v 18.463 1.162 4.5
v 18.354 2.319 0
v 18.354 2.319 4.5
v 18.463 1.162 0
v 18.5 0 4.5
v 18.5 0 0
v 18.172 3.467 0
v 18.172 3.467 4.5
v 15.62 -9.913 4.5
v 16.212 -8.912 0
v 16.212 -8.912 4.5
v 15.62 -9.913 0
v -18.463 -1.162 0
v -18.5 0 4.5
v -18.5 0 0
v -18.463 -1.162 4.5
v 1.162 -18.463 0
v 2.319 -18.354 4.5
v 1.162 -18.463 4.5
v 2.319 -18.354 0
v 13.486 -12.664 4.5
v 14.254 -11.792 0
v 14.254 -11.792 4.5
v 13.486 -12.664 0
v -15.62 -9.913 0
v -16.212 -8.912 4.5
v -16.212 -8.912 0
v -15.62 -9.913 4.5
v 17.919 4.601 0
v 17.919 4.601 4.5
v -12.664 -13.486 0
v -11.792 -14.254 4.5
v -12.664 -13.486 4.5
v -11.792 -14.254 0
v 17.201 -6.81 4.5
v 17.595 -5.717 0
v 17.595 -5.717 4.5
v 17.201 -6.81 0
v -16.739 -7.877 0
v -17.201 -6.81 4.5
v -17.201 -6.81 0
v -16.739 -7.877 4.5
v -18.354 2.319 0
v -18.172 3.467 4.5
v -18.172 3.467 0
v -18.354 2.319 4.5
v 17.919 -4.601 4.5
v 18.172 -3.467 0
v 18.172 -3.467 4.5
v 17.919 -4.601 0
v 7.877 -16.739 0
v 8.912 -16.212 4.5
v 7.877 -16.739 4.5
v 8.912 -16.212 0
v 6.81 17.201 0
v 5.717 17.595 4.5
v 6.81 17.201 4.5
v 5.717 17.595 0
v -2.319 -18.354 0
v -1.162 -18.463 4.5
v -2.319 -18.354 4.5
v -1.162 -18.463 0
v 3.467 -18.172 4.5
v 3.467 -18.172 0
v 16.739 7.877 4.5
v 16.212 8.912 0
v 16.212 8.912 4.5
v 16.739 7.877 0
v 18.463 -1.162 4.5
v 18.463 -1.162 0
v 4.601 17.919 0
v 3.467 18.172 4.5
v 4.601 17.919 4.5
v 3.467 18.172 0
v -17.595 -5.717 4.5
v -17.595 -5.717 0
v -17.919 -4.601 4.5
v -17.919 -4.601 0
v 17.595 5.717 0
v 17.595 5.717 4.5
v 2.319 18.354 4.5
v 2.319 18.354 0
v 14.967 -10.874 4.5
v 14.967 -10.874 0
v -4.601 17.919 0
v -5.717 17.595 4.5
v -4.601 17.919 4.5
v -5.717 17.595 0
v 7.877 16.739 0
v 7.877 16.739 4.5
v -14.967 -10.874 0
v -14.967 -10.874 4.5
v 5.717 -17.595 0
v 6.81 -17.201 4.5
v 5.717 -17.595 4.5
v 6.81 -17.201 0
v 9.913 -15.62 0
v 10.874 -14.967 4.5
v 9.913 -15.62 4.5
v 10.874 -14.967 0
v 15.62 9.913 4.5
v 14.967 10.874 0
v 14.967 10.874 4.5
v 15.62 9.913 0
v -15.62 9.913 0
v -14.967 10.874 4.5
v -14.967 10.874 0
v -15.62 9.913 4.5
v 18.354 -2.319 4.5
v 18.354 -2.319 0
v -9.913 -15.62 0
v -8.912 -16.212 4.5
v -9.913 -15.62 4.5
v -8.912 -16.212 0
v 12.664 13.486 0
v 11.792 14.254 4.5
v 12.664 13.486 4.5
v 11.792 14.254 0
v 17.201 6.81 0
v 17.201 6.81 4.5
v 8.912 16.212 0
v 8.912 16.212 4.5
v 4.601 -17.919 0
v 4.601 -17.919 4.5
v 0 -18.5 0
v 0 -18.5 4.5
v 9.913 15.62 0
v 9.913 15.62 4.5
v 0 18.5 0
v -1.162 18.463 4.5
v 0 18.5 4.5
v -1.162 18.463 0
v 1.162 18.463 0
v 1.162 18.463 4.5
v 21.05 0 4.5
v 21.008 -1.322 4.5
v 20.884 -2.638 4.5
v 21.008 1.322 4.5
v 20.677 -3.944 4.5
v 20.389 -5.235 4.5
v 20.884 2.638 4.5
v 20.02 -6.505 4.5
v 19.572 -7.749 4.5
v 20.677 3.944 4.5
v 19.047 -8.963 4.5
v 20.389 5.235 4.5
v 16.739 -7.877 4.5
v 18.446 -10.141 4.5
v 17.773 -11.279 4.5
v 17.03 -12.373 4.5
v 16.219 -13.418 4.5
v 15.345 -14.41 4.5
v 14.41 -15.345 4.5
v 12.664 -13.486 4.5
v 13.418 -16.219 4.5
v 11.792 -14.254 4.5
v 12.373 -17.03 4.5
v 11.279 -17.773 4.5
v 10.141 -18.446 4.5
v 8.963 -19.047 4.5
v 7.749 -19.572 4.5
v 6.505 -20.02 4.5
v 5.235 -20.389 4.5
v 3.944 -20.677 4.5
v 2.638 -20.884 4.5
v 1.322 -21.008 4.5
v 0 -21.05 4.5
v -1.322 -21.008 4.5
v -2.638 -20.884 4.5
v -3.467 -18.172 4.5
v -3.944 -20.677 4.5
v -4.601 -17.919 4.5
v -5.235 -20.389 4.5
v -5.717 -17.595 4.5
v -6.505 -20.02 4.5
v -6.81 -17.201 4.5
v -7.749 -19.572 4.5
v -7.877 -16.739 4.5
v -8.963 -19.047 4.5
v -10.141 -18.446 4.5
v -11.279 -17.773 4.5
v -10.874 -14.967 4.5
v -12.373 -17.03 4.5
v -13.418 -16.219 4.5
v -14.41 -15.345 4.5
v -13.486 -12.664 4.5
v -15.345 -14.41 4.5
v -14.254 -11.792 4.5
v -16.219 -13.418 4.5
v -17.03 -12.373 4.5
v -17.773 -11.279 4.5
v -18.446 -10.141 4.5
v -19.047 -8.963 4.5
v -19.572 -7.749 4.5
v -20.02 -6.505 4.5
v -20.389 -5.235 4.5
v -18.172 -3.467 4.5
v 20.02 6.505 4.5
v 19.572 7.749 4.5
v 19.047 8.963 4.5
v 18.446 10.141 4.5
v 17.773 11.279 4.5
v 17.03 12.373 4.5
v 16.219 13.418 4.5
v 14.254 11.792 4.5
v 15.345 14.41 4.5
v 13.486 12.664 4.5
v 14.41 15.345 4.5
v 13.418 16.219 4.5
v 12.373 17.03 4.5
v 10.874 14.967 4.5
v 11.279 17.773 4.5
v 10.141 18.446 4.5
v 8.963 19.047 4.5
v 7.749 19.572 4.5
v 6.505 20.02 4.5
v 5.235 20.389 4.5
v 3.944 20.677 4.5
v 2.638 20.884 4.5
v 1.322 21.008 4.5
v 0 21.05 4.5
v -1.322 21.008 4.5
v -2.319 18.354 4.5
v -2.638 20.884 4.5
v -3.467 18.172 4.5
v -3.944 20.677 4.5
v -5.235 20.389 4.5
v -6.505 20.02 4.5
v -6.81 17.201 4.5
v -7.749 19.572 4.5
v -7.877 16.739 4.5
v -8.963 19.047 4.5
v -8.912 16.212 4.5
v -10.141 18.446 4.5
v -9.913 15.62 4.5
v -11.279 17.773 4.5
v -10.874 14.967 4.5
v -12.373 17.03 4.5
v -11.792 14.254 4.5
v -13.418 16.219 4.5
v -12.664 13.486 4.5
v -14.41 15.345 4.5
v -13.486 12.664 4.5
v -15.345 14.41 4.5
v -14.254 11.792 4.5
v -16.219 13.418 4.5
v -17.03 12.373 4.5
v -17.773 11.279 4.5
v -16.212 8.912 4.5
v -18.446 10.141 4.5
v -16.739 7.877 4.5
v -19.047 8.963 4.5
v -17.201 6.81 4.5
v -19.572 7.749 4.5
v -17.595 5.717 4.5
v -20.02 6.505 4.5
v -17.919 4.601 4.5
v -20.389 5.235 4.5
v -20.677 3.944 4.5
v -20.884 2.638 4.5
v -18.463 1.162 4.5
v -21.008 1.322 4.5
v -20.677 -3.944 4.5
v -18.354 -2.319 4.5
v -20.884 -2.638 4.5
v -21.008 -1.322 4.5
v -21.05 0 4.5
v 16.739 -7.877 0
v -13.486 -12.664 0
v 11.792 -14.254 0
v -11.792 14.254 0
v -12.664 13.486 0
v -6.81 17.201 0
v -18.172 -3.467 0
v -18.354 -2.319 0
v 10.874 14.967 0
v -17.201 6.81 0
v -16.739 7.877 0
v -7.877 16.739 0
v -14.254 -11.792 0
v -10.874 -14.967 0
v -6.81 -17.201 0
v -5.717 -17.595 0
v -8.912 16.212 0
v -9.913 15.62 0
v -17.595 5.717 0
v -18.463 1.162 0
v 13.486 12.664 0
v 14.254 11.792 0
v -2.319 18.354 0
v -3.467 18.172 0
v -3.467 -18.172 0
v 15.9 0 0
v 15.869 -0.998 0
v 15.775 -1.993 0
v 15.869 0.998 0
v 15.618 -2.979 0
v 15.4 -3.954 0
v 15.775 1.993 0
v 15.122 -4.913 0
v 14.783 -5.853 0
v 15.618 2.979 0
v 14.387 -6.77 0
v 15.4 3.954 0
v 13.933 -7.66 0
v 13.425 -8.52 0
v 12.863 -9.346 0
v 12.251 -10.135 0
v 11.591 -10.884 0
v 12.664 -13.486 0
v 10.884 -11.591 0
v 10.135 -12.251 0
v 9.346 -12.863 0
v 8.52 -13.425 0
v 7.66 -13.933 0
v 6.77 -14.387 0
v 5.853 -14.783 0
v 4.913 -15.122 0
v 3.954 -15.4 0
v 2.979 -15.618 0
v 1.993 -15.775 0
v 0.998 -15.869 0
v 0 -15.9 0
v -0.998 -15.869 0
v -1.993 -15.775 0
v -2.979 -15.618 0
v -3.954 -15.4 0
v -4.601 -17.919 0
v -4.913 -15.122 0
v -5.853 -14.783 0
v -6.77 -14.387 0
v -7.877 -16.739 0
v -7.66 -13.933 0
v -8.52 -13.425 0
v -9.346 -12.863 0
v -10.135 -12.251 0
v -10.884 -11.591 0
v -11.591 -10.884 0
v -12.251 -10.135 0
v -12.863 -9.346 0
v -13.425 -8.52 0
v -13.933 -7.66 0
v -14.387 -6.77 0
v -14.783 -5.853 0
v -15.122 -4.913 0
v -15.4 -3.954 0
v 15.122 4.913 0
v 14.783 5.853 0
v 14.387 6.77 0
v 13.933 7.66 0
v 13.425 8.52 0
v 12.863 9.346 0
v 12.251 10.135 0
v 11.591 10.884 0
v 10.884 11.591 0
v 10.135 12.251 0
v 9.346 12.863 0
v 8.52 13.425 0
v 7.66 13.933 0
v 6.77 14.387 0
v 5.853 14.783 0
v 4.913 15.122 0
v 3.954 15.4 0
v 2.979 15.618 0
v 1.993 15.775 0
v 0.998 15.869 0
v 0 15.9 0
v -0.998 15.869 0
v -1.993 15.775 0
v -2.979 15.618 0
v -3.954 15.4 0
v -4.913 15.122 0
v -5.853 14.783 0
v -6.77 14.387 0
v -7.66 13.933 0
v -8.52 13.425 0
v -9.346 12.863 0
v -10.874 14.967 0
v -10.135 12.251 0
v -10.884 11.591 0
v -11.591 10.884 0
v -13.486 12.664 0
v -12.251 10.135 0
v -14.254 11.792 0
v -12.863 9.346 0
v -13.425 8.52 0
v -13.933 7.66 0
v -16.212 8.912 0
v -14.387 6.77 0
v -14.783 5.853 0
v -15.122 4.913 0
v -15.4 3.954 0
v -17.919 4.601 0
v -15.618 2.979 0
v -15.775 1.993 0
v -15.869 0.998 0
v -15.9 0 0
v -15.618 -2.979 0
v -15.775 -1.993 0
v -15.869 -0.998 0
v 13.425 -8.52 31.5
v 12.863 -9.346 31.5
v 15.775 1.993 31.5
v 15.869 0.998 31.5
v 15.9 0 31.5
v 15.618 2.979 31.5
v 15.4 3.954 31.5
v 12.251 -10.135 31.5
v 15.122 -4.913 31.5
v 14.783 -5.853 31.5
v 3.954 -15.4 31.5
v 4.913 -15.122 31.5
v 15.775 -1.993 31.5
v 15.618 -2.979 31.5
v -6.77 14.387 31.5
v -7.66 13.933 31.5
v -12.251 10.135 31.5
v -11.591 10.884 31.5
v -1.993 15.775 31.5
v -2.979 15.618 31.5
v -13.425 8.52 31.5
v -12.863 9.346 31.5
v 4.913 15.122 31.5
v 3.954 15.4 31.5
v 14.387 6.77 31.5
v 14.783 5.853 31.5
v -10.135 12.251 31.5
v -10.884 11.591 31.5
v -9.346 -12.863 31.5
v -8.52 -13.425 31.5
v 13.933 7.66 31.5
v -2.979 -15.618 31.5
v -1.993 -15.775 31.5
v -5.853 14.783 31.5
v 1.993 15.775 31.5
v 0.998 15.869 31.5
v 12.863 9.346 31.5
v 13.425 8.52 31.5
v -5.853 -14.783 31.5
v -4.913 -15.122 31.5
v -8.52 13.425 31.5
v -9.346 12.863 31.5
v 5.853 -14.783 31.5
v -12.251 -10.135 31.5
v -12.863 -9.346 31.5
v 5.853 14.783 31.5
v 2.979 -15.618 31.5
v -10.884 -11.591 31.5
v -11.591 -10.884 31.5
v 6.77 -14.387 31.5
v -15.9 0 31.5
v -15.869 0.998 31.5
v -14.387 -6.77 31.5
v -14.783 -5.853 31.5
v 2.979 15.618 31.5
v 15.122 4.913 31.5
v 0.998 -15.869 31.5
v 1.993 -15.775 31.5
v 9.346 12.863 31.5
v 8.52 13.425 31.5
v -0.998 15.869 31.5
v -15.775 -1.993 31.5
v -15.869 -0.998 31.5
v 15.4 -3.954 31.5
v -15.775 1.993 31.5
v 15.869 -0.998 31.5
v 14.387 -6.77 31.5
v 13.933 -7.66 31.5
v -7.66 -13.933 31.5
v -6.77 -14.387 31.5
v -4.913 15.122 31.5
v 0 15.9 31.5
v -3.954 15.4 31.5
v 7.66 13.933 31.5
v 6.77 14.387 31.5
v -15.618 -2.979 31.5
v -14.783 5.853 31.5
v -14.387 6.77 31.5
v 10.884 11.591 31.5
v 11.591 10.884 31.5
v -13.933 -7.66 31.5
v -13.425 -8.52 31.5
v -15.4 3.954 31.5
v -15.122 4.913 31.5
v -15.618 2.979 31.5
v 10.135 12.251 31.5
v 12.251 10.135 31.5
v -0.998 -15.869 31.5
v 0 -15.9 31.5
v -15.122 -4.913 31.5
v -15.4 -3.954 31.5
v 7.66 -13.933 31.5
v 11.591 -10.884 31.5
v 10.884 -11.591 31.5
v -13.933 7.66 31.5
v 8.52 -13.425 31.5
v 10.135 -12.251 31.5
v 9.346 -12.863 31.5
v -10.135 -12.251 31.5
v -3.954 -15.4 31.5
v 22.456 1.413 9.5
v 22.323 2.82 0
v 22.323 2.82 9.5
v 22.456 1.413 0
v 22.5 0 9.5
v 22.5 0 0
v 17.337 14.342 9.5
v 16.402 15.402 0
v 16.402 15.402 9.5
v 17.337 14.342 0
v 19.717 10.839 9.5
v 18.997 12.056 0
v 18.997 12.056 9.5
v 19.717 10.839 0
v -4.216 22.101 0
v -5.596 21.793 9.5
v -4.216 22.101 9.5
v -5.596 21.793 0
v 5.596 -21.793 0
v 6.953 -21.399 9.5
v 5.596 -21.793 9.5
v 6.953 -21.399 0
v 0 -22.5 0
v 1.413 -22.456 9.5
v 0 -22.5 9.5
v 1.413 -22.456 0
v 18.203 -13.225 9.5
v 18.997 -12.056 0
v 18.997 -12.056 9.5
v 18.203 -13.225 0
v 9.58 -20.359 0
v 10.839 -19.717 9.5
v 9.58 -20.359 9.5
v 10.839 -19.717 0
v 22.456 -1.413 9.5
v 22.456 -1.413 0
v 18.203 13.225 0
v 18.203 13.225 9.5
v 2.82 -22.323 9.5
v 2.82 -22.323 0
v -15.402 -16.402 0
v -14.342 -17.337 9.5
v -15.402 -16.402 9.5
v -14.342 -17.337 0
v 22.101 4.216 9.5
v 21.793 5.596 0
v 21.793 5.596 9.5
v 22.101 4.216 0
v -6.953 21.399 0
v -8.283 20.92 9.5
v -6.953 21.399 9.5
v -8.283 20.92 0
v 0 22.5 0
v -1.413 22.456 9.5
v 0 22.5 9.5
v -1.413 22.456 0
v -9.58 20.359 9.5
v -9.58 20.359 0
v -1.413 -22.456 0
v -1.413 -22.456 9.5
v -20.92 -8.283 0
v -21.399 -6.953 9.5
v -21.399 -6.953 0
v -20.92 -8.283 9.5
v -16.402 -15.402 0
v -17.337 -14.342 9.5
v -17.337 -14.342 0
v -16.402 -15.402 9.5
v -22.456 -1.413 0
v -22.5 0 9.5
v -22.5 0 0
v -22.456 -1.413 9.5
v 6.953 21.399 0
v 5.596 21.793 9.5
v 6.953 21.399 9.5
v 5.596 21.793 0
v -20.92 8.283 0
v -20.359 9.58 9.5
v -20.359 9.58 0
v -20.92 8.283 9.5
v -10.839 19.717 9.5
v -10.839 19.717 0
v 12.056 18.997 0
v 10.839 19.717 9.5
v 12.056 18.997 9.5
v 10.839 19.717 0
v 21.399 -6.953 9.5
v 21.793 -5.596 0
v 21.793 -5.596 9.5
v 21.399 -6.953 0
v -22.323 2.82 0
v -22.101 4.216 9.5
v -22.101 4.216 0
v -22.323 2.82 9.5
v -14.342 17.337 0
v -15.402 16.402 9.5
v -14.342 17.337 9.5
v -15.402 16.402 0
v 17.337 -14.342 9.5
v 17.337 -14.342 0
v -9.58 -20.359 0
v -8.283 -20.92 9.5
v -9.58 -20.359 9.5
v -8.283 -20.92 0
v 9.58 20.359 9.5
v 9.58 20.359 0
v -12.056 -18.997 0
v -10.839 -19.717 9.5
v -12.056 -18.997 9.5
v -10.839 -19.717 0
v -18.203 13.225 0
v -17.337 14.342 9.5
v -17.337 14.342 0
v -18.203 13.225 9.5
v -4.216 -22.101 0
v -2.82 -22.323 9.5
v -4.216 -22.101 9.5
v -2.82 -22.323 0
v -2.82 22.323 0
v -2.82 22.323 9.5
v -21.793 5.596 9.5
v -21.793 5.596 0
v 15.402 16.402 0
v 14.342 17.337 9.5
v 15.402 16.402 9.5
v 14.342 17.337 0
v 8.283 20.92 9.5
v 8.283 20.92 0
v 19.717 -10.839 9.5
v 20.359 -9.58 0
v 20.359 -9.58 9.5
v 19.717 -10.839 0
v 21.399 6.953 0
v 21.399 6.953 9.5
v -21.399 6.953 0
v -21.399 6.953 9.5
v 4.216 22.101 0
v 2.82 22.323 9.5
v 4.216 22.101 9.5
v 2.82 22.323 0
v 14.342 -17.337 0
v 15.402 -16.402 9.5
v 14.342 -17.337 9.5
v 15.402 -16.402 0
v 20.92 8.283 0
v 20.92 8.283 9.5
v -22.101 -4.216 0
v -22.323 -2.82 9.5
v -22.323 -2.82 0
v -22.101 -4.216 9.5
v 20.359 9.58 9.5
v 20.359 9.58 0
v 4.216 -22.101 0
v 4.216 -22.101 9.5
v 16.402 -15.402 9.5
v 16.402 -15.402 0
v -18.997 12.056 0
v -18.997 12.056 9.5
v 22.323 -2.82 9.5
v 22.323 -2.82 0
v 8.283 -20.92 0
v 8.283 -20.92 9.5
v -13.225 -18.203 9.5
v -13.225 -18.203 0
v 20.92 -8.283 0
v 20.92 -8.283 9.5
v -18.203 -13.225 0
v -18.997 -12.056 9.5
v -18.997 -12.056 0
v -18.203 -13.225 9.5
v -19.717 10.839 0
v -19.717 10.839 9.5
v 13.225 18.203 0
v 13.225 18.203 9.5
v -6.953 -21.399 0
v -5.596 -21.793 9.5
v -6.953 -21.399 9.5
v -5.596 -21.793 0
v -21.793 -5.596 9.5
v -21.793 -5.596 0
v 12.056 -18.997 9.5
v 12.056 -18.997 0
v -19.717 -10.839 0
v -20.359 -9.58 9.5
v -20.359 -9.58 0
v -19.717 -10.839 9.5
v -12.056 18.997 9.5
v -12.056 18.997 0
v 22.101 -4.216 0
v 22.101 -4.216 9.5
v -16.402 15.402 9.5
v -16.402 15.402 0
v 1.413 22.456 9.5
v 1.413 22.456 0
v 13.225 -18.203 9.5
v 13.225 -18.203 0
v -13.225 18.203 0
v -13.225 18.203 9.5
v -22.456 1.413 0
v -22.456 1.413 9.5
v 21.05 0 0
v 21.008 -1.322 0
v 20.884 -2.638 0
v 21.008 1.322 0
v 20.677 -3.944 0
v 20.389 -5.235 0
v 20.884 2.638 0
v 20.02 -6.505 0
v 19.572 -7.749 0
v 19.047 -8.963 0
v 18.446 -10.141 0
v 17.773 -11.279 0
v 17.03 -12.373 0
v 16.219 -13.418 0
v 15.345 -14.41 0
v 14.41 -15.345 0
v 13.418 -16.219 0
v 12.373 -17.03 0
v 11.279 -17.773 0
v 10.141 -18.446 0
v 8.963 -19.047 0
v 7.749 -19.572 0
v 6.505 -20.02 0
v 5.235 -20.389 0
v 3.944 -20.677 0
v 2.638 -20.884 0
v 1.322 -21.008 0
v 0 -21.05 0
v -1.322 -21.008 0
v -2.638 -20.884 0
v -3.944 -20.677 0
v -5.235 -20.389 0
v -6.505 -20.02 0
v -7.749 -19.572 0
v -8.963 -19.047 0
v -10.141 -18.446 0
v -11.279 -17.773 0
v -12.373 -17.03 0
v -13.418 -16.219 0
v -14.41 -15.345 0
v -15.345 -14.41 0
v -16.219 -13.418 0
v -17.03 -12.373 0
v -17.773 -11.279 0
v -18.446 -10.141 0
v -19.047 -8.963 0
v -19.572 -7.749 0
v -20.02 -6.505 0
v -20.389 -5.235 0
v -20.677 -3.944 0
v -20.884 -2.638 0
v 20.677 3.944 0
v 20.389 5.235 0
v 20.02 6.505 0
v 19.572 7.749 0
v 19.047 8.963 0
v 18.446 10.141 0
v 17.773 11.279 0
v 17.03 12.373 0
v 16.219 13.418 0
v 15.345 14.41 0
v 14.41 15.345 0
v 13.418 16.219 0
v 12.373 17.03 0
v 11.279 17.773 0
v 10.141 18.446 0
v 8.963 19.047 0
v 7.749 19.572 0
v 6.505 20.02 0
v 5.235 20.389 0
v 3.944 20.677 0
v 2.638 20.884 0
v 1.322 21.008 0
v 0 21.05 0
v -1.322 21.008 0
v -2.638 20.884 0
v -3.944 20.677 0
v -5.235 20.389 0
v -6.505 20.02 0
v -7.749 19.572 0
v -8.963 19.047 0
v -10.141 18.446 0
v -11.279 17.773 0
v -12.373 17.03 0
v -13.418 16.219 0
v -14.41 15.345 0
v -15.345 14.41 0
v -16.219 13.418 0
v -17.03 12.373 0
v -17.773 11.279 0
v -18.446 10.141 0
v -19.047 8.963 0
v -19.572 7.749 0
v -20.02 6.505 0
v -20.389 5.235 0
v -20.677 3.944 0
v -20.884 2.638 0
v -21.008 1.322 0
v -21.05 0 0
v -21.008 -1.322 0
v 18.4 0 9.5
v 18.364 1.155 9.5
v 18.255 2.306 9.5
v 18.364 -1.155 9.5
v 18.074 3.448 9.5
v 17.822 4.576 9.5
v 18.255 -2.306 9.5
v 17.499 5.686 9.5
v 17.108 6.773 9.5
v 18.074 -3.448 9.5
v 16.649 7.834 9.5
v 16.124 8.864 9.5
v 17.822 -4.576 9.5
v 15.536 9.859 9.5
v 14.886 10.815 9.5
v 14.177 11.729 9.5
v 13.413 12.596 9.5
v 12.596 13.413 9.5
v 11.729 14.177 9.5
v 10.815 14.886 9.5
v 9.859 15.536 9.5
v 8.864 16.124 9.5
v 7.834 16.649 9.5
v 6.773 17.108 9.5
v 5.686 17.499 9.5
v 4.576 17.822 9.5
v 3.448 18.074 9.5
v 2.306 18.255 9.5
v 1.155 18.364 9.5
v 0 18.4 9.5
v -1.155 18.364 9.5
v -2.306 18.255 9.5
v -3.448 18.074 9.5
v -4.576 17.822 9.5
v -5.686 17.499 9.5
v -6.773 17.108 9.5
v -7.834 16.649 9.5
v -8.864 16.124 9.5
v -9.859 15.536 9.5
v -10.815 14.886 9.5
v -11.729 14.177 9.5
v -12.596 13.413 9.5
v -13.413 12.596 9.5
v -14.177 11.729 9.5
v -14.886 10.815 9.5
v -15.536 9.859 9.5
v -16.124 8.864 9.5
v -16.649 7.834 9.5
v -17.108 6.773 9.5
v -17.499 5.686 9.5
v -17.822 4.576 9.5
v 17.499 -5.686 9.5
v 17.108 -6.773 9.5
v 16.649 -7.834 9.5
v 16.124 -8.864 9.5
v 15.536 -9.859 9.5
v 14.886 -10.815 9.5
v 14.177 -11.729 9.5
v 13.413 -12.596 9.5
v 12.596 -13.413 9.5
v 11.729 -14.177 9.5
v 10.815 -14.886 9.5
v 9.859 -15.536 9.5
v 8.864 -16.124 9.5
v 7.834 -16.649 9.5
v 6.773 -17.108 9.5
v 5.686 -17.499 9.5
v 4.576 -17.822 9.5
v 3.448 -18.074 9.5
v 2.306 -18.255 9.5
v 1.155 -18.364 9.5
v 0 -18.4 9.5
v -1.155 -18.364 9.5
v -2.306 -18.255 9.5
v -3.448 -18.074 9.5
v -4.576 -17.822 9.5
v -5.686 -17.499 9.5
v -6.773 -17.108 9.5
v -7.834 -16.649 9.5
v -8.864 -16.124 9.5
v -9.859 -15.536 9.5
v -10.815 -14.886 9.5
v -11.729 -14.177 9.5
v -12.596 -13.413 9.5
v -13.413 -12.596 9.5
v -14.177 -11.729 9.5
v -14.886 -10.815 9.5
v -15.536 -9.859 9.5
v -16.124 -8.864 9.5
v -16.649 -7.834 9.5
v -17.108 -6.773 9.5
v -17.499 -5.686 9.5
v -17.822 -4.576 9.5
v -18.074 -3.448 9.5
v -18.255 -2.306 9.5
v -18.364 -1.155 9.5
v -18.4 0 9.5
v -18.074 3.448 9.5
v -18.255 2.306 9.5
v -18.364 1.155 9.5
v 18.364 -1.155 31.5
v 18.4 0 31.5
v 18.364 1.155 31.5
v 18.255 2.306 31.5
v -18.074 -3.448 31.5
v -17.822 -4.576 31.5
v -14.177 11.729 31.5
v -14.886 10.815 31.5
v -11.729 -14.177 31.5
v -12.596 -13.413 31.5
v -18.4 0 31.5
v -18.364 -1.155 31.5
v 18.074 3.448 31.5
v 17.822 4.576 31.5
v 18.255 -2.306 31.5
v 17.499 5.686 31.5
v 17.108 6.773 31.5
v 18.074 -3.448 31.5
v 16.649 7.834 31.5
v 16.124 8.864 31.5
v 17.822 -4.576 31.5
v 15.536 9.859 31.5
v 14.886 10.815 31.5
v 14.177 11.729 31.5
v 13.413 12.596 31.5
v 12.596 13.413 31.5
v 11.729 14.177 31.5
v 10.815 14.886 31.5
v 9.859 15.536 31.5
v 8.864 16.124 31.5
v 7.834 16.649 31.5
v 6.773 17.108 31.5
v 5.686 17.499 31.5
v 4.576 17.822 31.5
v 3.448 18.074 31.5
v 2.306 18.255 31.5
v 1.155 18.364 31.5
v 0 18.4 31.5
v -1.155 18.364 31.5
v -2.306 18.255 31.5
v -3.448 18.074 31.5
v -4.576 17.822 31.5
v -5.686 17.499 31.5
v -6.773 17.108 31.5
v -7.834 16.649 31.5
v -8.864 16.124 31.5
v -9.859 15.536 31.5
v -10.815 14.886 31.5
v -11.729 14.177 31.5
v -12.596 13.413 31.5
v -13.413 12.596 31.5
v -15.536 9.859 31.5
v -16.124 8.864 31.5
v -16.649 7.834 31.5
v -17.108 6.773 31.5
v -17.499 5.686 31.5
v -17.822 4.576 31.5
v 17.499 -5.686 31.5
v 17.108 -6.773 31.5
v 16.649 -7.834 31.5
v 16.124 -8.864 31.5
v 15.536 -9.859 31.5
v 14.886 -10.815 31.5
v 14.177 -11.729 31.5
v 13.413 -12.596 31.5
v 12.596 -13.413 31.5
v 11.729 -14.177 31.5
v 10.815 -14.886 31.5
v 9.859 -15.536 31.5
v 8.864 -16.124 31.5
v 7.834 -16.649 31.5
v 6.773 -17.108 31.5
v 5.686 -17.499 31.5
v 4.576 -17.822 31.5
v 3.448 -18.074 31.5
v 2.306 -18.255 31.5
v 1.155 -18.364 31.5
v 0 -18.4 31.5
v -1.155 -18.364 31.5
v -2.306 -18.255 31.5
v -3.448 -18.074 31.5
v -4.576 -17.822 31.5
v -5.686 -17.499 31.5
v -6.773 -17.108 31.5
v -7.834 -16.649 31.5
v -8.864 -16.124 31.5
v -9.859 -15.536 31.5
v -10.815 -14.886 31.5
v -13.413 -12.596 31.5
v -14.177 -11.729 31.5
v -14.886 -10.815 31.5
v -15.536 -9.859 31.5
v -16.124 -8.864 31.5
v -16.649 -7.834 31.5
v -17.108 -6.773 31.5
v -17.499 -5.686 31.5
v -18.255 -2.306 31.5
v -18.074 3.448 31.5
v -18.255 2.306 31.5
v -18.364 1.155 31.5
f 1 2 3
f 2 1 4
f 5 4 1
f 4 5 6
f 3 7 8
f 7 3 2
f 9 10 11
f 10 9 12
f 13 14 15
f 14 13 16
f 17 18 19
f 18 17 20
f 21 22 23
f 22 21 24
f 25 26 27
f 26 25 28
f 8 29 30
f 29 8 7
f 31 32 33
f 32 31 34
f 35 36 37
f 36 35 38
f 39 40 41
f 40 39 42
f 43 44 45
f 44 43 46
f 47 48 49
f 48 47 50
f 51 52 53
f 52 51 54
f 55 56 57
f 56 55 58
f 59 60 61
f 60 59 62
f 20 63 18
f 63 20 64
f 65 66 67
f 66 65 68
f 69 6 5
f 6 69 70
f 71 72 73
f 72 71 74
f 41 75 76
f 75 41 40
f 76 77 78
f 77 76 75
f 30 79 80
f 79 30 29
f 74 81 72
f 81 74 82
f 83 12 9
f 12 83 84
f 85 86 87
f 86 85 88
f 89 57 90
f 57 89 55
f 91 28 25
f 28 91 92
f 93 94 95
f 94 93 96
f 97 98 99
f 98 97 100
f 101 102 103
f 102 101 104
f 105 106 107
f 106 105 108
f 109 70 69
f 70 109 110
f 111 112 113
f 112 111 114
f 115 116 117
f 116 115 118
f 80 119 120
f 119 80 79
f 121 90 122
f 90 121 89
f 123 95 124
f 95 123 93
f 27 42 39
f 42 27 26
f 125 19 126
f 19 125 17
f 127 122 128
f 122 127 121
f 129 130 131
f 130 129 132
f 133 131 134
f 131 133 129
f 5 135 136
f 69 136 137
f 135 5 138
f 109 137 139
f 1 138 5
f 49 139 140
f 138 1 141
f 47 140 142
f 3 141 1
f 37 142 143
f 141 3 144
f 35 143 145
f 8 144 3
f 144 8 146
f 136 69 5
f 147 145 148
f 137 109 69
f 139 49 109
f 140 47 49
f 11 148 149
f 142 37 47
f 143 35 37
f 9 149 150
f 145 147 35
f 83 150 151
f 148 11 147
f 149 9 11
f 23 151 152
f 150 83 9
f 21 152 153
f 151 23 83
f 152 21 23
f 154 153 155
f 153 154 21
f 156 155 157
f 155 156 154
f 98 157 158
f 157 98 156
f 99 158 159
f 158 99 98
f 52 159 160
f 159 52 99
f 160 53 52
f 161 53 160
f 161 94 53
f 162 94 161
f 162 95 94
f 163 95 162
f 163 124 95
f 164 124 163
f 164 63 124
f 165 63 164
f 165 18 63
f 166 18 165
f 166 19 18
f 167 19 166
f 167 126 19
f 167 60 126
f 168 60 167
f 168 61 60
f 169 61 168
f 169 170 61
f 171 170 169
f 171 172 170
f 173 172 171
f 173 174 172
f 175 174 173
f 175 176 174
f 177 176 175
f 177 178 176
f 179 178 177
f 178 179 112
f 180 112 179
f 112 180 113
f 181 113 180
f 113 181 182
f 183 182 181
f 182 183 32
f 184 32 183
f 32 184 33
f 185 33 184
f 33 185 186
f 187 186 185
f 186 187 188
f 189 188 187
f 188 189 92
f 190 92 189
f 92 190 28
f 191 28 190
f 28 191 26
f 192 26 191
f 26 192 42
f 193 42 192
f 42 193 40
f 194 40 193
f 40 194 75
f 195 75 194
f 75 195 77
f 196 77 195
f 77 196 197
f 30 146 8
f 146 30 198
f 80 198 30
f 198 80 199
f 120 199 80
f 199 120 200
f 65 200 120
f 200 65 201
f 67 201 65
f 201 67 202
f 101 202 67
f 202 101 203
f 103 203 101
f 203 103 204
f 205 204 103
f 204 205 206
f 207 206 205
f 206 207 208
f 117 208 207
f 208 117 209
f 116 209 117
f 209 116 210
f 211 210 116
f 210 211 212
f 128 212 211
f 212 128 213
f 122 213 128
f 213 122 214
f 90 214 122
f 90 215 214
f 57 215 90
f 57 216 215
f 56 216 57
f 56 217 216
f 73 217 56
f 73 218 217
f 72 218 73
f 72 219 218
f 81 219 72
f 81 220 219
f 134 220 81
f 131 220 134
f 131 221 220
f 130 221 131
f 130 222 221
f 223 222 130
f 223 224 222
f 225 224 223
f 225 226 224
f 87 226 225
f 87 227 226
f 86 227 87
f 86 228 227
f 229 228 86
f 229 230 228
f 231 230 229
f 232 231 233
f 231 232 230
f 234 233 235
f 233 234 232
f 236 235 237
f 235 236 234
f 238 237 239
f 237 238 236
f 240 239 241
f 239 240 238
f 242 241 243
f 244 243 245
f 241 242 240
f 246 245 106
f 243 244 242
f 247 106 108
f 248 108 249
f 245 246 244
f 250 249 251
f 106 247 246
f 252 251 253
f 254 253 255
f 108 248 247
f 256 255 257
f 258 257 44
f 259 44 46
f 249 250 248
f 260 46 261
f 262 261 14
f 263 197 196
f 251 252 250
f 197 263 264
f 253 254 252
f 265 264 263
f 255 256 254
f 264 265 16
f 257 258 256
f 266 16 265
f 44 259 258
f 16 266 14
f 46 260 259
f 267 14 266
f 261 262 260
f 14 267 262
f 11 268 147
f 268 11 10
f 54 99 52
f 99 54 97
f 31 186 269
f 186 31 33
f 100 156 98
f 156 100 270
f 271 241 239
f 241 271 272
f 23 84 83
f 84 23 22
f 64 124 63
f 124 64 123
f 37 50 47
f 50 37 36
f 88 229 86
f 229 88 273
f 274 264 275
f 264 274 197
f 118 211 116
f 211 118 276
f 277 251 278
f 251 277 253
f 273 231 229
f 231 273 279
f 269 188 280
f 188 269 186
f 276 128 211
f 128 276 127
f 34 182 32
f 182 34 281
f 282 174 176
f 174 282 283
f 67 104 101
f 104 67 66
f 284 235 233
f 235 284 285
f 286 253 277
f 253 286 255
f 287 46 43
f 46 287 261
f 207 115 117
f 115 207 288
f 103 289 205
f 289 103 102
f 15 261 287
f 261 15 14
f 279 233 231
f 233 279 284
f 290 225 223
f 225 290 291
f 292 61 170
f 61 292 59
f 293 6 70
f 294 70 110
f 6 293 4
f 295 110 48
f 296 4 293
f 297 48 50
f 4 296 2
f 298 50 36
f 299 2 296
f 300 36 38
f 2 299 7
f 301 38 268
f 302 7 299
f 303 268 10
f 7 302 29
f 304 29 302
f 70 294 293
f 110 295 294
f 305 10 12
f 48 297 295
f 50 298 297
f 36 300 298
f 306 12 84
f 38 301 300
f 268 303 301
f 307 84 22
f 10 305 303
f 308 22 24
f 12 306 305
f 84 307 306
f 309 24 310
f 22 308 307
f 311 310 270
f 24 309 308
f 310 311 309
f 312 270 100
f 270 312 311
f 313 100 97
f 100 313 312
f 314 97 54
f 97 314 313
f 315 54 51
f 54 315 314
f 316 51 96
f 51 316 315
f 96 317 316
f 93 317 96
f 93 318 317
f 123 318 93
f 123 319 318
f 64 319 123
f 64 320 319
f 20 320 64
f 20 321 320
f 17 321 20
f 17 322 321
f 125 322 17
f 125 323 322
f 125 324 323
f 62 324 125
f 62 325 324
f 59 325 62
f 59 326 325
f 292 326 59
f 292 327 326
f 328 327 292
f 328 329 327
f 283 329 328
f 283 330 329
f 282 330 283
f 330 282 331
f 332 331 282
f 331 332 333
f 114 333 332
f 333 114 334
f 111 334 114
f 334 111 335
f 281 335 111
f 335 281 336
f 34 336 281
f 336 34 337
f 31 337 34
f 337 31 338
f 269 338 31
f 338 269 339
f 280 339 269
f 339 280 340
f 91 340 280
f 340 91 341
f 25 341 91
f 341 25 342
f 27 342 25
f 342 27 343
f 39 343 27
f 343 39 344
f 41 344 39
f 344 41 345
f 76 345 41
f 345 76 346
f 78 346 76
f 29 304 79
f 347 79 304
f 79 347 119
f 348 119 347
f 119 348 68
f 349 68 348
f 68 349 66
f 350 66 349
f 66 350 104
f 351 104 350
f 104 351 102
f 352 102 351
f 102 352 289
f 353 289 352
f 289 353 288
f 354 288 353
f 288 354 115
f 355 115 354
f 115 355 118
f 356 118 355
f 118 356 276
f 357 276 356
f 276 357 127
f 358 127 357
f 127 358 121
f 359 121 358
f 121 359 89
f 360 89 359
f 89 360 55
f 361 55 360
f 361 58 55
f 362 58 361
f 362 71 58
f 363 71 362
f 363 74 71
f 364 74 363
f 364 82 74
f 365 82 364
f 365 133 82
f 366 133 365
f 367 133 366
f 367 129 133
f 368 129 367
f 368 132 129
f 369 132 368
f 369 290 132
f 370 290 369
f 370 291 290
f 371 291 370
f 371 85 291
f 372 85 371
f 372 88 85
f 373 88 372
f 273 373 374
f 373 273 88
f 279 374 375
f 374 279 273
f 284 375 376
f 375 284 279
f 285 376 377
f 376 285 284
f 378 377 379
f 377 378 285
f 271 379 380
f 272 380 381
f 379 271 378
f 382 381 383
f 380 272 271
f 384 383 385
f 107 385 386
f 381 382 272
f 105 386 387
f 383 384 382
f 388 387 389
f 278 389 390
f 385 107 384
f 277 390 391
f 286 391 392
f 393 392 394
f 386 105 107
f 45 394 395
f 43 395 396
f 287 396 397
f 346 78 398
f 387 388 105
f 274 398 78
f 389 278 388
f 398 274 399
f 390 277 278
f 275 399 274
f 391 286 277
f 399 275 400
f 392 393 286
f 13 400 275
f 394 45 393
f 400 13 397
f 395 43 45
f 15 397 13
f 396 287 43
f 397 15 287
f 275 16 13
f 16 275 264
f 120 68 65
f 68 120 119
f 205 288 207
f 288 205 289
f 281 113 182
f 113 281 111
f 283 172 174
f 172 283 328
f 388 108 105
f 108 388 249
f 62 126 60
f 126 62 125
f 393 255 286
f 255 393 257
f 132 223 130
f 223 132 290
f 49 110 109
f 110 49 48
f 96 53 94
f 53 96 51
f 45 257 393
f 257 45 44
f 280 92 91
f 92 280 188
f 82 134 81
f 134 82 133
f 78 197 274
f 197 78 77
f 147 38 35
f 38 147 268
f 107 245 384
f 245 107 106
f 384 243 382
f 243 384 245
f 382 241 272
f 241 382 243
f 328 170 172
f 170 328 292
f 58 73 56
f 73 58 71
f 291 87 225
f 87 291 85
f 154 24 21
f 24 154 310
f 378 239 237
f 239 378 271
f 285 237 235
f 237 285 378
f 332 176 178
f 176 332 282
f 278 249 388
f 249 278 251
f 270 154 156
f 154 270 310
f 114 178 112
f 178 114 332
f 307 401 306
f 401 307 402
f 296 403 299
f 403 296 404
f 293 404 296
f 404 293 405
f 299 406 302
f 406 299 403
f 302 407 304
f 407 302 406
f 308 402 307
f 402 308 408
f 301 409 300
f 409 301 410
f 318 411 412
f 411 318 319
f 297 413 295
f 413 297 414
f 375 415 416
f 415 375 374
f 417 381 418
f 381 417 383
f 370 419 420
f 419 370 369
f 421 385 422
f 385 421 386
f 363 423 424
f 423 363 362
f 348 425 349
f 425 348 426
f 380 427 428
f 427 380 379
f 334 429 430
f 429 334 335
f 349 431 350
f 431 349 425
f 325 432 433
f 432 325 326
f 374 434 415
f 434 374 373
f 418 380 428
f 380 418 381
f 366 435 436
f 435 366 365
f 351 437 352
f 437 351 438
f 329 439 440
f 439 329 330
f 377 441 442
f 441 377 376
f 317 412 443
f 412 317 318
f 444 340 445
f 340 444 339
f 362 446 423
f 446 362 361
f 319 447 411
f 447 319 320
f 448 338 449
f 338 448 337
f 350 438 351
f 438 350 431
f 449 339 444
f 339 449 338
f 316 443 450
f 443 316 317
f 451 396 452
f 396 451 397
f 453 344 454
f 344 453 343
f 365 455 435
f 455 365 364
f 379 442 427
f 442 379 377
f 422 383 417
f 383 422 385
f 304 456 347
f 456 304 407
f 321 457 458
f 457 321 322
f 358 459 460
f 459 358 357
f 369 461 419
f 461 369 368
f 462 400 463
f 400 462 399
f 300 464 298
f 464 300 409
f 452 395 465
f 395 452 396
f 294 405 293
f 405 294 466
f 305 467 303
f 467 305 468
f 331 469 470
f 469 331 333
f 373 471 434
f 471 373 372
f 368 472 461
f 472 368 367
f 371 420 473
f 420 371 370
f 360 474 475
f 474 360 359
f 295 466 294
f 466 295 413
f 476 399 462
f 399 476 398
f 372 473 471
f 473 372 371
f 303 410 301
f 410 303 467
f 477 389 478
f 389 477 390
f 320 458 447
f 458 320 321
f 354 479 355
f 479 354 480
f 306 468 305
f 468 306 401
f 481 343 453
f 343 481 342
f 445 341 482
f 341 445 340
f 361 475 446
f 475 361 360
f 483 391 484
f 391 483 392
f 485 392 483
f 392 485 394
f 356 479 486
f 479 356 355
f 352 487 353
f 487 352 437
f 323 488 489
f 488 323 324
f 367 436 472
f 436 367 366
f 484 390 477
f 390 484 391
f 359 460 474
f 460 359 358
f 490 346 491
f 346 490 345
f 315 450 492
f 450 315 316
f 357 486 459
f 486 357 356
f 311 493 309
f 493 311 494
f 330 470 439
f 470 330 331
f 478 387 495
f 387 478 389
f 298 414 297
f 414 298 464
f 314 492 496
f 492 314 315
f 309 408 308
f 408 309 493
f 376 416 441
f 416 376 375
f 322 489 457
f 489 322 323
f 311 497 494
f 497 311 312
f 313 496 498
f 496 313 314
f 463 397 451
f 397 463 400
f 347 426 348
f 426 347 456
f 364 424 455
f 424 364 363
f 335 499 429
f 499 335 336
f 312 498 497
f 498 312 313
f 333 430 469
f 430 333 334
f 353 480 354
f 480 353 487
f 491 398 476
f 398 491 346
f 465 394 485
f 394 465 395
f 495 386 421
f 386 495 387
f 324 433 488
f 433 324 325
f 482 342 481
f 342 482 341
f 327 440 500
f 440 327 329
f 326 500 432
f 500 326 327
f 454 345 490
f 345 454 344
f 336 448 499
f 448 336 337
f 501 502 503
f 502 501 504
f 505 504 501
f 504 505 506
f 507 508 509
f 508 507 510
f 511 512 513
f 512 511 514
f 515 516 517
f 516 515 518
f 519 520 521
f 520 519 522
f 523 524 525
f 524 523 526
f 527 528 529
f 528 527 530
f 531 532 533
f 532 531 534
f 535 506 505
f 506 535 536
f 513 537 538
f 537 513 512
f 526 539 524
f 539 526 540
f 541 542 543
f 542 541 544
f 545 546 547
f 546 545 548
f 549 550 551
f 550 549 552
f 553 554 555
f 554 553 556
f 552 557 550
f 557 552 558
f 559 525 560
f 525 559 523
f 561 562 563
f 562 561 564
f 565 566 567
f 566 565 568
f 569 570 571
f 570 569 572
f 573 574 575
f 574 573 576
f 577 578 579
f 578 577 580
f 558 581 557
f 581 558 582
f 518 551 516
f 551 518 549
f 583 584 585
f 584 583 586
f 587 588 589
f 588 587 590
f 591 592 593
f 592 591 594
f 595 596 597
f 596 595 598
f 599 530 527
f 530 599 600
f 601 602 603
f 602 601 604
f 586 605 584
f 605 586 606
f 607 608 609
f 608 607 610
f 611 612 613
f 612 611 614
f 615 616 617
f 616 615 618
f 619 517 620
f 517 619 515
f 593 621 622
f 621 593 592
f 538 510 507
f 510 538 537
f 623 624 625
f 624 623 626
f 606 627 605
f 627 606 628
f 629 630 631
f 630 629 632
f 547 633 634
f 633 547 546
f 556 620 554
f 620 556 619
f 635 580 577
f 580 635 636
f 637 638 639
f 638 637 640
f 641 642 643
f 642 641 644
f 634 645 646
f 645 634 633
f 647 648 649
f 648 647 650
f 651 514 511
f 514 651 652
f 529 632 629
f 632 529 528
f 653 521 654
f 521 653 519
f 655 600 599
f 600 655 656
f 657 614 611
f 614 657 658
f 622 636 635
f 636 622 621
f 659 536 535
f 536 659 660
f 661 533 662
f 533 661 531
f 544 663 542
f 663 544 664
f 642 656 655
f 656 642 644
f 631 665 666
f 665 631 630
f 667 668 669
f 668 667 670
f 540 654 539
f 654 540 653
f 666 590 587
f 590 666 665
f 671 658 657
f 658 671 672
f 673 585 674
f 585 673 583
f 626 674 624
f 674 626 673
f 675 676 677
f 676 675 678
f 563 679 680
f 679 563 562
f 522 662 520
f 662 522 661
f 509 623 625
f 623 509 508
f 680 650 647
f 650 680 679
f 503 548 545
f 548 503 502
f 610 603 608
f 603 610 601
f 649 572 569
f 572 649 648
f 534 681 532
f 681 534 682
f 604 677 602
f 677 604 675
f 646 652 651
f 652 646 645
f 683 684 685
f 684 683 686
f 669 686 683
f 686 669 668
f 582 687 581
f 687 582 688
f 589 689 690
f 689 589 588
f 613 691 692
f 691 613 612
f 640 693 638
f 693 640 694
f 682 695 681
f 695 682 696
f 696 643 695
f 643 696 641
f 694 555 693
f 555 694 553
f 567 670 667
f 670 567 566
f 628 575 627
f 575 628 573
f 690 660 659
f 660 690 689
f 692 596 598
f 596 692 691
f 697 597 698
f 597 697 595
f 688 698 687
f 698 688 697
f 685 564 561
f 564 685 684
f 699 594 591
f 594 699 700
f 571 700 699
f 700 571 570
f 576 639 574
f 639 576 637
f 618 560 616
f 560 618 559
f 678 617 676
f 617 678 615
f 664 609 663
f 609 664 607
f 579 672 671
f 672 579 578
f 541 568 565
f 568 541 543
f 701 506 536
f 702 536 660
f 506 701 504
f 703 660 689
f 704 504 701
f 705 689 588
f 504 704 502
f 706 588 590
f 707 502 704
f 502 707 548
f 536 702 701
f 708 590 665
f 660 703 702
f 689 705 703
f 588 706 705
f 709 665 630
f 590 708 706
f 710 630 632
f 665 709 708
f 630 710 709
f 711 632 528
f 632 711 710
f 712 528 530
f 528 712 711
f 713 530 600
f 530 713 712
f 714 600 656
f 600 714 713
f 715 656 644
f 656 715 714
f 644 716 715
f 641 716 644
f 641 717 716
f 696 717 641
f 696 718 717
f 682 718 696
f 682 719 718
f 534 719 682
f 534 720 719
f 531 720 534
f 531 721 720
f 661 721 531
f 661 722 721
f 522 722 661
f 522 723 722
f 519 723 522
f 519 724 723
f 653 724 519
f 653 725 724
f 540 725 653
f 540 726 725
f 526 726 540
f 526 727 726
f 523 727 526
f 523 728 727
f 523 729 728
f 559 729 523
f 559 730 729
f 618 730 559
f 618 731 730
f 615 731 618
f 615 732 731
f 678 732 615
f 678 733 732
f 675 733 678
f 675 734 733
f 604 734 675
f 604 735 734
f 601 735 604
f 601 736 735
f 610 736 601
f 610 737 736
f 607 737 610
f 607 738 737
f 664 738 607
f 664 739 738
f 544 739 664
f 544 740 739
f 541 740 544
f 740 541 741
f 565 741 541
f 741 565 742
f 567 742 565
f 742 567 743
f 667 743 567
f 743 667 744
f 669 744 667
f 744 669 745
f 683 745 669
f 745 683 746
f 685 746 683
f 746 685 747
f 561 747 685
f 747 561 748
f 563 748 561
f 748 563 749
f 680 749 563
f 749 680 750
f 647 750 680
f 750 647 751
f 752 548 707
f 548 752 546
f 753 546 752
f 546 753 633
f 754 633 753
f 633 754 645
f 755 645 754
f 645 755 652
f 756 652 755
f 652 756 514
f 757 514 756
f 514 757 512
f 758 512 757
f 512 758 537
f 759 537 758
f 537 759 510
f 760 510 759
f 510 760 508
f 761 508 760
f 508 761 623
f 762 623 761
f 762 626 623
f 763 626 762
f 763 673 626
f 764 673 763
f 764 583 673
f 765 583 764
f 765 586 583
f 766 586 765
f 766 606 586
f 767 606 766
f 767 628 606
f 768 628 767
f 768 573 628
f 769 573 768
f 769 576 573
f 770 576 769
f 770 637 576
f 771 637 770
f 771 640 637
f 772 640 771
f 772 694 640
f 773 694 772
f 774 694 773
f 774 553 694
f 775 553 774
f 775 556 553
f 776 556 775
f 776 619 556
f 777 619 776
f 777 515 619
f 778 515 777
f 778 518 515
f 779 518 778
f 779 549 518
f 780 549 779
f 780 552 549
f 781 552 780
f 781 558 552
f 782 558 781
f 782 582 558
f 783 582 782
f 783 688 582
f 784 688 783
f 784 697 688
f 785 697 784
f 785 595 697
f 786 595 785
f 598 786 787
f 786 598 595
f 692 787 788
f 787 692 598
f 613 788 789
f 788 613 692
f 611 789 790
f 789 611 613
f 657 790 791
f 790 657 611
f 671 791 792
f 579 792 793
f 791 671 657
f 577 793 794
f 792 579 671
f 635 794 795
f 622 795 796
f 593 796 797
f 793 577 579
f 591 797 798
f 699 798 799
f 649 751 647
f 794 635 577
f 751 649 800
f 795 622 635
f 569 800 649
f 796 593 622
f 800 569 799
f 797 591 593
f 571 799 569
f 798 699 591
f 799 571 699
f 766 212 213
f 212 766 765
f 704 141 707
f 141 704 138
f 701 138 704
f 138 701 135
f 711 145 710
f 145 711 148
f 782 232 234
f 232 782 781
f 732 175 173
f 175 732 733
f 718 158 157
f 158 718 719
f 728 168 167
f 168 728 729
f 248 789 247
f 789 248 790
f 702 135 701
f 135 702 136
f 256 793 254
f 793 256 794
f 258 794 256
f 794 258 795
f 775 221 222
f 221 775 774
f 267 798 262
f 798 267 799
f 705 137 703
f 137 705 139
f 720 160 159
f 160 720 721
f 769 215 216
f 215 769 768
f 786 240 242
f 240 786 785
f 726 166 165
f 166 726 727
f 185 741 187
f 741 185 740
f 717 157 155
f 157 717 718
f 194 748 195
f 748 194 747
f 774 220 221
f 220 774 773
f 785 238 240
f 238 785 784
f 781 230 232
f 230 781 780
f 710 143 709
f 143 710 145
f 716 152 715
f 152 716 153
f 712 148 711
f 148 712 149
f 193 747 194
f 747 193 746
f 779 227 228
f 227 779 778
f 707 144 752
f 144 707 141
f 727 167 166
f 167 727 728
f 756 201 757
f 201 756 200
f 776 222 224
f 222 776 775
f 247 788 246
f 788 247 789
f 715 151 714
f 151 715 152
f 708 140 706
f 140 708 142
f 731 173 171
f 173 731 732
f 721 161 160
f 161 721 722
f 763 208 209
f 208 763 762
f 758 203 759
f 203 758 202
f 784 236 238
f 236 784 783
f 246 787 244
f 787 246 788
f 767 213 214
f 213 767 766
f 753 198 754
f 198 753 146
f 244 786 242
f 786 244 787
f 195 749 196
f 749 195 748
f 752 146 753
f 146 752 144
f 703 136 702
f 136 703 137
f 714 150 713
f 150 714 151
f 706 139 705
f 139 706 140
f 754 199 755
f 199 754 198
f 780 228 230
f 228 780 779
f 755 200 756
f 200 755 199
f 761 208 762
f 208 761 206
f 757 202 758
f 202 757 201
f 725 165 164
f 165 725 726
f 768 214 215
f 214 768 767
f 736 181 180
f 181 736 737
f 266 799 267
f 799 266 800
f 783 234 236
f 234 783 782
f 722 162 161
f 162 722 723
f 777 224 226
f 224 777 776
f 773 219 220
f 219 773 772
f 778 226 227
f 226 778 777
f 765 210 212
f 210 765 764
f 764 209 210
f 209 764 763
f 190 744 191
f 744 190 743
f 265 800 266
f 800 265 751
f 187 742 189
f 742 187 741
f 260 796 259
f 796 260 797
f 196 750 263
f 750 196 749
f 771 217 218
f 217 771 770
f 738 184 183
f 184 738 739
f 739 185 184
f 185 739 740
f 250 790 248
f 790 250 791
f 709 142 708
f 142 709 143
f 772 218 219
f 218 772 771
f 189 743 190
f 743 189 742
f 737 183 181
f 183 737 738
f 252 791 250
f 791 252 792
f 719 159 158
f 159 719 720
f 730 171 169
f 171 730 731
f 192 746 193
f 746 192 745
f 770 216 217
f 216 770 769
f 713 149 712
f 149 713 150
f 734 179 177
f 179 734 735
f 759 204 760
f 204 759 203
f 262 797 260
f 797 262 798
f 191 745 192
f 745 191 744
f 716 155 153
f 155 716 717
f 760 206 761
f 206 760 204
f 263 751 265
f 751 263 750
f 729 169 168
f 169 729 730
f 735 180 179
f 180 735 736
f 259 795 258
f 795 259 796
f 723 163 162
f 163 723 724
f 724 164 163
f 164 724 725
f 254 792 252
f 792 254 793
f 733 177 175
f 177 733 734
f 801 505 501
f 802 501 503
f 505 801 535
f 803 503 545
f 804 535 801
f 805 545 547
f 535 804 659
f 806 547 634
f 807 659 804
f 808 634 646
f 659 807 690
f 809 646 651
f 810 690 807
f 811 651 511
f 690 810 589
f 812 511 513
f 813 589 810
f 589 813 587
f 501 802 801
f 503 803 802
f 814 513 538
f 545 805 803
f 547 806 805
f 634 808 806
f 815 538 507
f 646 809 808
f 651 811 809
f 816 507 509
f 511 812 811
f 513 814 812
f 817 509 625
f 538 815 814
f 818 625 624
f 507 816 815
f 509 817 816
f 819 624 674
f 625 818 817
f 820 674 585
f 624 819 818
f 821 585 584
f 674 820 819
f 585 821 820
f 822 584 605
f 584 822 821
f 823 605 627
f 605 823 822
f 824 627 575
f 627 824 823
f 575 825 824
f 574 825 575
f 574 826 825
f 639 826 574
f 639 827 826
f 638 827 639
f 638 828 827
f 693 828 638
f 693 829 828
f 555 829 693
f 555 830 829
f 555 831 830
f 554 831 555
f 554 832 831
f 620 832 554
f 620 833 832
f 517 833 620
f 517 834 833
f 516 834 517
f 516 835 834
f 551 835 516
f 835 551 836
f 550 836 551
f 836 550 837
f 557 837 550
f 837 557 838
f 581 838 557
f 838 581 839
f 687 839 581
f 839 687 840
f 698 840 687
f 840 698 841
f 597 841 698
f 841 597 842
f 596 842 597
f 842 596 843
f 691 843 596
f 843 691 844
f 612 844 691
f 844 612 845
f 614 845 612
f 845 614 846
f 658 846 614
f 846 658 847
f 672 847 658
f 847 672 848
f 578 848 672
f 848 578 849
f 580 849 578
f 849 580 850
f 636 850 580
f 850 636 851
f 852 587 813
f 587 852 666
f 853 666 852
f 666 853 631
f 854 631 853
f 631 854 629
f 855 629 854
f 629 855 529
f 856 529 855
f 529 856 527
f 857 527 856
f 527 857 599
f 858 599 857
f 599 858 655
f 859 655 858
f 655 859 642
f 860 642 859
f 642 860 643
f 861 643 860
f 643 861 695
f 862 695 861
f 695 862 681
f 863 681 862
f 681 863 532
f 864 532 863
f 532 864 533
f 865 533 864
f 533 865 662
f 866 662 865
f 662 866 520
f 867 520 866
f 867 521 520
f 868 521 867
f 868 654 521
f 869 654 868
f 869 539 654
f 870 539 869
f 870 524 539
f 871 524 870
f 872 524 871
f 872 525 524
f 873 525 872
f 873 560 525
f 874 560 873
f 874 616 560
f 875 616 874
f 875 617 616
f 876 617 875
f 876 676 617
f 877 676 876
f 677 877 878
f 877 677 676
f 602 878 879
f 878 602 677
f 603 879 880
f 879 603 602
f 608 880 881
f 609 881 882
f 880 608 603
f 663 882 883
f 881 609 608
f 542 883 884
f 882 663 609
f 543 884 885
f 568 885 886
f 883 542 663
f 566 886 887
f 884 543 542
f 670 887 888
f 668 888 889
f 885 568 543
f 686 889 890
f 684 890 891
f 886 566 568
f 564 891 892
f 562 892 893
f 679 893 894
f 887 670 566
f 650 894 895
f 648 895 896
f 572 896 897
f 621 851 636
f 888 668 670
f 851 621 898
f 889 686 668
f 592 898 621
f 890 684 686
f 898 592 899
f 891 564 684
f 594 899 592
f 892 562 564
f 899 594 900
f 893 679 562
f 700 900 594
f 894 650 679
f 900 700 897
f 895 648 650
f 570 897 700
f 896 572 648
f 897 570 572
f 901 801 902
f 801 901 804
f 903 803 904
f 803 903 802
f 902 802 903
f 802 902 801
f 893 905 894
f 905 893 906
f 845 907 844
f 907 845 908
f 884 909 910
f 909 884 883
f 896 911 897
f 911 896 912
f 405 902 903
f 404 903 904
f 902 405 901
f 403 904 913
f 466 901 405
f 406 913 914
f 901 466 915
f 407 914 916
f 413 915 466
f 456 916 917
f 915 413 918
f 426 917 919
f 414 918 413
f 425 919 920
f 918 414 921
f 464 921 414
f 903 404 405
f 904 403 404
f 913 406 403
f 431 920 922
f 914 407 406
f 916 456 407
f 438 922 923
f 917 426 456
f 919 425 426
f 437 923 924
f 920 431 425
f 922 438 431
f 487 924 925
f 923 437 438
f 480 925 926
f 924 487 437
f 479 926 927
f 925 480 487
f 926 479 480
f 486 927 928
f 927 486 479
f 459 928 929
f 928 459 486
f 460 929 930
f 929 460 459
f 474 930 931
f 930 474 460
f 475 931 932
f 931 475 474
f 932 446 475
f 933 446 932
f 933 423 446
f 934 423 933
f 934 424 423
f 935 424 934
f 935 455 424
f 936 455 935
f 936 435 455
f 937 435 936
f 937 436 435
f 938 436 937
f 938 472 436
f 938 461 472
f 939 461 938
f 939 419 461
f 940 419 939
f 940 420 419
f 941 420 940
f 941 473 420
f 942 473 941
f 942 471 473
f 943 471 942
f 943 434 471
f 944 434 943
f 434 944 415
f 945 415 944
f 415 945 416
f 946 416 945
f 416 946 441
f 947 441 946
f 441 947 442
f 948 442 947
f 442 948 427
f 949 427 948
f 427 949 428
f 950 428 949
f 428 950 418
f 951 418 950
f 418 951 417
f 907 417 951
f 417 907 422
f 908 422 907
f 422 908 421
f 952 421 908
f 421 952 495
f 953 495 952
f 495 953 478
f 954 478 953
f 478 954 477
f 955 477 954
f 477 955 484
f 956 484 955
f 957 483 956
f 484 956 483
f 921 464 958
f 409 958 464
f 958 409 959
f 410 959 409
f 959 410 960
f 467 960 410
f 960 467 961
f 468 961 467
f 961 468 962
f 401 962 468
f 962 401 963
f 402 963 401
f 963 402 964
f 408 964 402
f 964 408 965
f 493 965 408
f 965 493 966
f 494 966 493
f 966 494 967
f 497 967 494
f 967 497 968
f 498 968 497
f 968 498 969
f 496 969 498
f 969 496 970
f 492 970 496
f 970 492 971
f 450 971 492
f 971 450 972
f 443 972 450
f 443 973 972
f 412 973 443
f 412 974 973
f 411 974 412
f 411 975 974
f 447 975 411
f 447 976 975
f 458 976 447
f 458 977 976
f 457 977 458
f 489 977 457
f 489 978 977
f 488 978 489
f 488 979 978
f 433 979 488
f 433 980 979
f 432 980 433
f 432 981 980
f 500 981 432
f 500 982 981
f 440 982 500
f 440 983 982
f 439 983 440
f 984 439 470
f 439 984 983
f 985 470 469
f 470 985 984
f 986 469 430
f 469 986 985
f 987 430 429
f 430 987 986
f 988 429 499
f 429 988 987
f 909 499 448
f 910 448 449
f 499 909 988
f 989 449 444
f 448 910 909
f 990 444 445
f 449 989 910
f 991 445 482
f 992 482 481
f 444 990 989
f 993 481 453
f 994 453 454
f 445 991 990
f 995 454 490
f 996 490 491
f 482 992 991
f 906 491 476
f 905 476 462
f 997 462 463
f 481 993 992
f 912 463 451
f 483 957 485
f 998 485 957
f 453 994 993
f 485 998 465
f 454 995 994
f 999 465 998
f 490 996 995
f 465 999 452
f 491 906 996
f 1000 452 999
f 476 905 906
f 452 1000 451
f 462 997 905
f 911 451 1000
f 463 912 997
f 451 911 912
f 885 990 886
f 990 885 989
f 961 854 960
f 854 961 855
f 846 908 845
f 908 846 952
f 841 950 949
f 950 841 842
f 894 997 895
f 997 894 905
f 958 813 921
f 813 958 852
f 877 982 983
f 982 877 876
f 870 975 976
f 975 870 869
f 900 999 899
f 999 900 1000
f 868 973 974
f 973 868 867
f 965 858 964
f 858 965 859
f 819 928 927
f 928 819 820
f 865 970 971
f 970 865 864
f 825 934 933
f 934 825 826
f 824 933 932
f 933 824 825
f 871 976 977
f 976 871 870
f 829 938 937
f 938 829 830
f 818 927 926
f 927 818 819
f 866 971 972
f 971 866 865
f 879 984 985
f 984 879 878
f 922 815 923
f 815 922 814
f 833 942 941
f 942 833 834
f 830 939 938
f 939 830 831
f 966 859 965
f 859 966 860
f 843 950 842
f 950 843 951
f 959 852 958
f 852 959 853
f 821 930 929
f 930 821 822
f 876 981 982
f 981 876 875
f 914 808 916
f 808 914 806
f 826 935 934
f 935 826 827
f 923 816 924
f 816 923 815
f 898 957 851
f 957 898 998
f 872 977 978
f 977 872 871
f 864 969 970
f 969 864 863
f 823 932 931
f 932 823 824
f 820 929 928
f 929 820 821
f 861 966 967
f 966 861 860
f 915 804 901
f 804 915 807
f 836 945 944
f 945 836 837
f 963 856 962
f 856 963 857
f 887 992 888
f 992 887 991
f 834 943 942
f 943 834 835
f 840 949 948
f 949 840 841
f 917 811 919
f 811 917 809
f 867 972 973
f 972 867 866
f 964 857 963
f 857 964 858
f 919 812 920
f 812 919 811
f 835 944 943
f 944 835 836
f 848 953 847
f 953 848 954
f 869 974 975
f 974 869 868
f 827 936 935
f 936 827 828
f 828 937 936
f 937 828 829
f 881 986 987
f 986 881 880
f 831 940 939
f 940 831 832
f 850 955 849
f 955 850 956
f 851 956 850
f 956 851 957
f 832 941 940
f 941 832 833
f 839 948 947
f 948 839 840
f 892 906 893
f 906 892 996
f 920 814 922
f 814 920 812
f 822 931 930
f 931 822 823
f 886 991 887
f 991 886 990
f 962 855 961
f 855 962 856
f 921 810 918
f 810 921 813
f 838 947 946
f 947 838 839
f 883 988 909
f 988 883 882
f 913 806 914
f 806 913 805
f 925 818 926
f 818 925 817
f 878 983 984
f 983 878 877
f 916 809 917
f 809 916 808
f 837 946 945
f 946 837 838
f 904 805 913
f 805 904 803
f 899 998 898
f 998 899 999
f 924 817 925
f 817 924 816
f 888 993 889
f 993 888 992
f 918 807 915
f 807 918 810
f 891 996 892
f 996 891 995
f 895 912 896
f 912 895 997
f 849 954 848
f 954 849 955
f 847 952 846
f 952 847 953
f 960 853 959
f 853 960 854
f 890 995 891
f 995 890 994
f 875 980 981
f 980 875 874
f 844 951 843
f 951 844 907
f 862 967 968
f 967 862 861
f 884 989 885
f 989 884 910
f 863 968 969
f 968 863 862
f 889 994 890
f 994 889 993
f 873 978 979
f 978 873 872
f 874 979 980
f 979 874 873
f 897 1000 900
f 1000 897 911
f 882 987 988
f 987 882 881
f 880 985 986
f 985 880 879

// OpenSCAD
// file: ../../modules/lid.scad
module lid(
  hole_diameter,
  edge_height,
  inner_border = 0,
  base_height = 1,
  edge_thickness = 1,
  $fn = 100
) {
  inner_radius = hole_diameter / 2;
  outer_radius = inner_radius + edge_thickness;

  cylinder(h = base_height, r = outer_radius);

  translate([ 0, 0, base_height ]) difference() {
    cylinder(h = edge_height, r = outer_radius);
    cylinder(h = edge_height + .01, r = hole_diameter / 2);
  }

  rotate_extrude() translate([inner_radius - inner_border, base_height]) difference() {
    square([inner_border, inner_border]);
    translate([0, inner_border]) circle(r = inner_border);
  }
}
// main file
use <../../modules/lid.scad>

$fn = 100;

tolerance = 0.3;
hole_diameter = 31.5 + tolerance;

difference() {
  cylinder(d = 37, h = 4.5);
  translate([0, 0, -1]) cylinder(d = hole_diameter, h = 6);
}

difference() {
  cylinder(d = 45, h = 4.5);
  translate([0, 0, -1]) cylinder(d = 41.8 + tolerance, h = 6);
}

translate([0, 0, 4.5]) {
  difference() {
    cylinder(d = 45, h = 5);
    translate([0, 0, -1]) cylinder(d = hole_diameter, h = 7);
  }

  translate([0, 0, 5]) difference() {
    cylinder(d = hole_diameter + 5, h = 22);
    translate([0, 0, -1]) cylinder(d = hole_diameter, h = 24);
  }
}
